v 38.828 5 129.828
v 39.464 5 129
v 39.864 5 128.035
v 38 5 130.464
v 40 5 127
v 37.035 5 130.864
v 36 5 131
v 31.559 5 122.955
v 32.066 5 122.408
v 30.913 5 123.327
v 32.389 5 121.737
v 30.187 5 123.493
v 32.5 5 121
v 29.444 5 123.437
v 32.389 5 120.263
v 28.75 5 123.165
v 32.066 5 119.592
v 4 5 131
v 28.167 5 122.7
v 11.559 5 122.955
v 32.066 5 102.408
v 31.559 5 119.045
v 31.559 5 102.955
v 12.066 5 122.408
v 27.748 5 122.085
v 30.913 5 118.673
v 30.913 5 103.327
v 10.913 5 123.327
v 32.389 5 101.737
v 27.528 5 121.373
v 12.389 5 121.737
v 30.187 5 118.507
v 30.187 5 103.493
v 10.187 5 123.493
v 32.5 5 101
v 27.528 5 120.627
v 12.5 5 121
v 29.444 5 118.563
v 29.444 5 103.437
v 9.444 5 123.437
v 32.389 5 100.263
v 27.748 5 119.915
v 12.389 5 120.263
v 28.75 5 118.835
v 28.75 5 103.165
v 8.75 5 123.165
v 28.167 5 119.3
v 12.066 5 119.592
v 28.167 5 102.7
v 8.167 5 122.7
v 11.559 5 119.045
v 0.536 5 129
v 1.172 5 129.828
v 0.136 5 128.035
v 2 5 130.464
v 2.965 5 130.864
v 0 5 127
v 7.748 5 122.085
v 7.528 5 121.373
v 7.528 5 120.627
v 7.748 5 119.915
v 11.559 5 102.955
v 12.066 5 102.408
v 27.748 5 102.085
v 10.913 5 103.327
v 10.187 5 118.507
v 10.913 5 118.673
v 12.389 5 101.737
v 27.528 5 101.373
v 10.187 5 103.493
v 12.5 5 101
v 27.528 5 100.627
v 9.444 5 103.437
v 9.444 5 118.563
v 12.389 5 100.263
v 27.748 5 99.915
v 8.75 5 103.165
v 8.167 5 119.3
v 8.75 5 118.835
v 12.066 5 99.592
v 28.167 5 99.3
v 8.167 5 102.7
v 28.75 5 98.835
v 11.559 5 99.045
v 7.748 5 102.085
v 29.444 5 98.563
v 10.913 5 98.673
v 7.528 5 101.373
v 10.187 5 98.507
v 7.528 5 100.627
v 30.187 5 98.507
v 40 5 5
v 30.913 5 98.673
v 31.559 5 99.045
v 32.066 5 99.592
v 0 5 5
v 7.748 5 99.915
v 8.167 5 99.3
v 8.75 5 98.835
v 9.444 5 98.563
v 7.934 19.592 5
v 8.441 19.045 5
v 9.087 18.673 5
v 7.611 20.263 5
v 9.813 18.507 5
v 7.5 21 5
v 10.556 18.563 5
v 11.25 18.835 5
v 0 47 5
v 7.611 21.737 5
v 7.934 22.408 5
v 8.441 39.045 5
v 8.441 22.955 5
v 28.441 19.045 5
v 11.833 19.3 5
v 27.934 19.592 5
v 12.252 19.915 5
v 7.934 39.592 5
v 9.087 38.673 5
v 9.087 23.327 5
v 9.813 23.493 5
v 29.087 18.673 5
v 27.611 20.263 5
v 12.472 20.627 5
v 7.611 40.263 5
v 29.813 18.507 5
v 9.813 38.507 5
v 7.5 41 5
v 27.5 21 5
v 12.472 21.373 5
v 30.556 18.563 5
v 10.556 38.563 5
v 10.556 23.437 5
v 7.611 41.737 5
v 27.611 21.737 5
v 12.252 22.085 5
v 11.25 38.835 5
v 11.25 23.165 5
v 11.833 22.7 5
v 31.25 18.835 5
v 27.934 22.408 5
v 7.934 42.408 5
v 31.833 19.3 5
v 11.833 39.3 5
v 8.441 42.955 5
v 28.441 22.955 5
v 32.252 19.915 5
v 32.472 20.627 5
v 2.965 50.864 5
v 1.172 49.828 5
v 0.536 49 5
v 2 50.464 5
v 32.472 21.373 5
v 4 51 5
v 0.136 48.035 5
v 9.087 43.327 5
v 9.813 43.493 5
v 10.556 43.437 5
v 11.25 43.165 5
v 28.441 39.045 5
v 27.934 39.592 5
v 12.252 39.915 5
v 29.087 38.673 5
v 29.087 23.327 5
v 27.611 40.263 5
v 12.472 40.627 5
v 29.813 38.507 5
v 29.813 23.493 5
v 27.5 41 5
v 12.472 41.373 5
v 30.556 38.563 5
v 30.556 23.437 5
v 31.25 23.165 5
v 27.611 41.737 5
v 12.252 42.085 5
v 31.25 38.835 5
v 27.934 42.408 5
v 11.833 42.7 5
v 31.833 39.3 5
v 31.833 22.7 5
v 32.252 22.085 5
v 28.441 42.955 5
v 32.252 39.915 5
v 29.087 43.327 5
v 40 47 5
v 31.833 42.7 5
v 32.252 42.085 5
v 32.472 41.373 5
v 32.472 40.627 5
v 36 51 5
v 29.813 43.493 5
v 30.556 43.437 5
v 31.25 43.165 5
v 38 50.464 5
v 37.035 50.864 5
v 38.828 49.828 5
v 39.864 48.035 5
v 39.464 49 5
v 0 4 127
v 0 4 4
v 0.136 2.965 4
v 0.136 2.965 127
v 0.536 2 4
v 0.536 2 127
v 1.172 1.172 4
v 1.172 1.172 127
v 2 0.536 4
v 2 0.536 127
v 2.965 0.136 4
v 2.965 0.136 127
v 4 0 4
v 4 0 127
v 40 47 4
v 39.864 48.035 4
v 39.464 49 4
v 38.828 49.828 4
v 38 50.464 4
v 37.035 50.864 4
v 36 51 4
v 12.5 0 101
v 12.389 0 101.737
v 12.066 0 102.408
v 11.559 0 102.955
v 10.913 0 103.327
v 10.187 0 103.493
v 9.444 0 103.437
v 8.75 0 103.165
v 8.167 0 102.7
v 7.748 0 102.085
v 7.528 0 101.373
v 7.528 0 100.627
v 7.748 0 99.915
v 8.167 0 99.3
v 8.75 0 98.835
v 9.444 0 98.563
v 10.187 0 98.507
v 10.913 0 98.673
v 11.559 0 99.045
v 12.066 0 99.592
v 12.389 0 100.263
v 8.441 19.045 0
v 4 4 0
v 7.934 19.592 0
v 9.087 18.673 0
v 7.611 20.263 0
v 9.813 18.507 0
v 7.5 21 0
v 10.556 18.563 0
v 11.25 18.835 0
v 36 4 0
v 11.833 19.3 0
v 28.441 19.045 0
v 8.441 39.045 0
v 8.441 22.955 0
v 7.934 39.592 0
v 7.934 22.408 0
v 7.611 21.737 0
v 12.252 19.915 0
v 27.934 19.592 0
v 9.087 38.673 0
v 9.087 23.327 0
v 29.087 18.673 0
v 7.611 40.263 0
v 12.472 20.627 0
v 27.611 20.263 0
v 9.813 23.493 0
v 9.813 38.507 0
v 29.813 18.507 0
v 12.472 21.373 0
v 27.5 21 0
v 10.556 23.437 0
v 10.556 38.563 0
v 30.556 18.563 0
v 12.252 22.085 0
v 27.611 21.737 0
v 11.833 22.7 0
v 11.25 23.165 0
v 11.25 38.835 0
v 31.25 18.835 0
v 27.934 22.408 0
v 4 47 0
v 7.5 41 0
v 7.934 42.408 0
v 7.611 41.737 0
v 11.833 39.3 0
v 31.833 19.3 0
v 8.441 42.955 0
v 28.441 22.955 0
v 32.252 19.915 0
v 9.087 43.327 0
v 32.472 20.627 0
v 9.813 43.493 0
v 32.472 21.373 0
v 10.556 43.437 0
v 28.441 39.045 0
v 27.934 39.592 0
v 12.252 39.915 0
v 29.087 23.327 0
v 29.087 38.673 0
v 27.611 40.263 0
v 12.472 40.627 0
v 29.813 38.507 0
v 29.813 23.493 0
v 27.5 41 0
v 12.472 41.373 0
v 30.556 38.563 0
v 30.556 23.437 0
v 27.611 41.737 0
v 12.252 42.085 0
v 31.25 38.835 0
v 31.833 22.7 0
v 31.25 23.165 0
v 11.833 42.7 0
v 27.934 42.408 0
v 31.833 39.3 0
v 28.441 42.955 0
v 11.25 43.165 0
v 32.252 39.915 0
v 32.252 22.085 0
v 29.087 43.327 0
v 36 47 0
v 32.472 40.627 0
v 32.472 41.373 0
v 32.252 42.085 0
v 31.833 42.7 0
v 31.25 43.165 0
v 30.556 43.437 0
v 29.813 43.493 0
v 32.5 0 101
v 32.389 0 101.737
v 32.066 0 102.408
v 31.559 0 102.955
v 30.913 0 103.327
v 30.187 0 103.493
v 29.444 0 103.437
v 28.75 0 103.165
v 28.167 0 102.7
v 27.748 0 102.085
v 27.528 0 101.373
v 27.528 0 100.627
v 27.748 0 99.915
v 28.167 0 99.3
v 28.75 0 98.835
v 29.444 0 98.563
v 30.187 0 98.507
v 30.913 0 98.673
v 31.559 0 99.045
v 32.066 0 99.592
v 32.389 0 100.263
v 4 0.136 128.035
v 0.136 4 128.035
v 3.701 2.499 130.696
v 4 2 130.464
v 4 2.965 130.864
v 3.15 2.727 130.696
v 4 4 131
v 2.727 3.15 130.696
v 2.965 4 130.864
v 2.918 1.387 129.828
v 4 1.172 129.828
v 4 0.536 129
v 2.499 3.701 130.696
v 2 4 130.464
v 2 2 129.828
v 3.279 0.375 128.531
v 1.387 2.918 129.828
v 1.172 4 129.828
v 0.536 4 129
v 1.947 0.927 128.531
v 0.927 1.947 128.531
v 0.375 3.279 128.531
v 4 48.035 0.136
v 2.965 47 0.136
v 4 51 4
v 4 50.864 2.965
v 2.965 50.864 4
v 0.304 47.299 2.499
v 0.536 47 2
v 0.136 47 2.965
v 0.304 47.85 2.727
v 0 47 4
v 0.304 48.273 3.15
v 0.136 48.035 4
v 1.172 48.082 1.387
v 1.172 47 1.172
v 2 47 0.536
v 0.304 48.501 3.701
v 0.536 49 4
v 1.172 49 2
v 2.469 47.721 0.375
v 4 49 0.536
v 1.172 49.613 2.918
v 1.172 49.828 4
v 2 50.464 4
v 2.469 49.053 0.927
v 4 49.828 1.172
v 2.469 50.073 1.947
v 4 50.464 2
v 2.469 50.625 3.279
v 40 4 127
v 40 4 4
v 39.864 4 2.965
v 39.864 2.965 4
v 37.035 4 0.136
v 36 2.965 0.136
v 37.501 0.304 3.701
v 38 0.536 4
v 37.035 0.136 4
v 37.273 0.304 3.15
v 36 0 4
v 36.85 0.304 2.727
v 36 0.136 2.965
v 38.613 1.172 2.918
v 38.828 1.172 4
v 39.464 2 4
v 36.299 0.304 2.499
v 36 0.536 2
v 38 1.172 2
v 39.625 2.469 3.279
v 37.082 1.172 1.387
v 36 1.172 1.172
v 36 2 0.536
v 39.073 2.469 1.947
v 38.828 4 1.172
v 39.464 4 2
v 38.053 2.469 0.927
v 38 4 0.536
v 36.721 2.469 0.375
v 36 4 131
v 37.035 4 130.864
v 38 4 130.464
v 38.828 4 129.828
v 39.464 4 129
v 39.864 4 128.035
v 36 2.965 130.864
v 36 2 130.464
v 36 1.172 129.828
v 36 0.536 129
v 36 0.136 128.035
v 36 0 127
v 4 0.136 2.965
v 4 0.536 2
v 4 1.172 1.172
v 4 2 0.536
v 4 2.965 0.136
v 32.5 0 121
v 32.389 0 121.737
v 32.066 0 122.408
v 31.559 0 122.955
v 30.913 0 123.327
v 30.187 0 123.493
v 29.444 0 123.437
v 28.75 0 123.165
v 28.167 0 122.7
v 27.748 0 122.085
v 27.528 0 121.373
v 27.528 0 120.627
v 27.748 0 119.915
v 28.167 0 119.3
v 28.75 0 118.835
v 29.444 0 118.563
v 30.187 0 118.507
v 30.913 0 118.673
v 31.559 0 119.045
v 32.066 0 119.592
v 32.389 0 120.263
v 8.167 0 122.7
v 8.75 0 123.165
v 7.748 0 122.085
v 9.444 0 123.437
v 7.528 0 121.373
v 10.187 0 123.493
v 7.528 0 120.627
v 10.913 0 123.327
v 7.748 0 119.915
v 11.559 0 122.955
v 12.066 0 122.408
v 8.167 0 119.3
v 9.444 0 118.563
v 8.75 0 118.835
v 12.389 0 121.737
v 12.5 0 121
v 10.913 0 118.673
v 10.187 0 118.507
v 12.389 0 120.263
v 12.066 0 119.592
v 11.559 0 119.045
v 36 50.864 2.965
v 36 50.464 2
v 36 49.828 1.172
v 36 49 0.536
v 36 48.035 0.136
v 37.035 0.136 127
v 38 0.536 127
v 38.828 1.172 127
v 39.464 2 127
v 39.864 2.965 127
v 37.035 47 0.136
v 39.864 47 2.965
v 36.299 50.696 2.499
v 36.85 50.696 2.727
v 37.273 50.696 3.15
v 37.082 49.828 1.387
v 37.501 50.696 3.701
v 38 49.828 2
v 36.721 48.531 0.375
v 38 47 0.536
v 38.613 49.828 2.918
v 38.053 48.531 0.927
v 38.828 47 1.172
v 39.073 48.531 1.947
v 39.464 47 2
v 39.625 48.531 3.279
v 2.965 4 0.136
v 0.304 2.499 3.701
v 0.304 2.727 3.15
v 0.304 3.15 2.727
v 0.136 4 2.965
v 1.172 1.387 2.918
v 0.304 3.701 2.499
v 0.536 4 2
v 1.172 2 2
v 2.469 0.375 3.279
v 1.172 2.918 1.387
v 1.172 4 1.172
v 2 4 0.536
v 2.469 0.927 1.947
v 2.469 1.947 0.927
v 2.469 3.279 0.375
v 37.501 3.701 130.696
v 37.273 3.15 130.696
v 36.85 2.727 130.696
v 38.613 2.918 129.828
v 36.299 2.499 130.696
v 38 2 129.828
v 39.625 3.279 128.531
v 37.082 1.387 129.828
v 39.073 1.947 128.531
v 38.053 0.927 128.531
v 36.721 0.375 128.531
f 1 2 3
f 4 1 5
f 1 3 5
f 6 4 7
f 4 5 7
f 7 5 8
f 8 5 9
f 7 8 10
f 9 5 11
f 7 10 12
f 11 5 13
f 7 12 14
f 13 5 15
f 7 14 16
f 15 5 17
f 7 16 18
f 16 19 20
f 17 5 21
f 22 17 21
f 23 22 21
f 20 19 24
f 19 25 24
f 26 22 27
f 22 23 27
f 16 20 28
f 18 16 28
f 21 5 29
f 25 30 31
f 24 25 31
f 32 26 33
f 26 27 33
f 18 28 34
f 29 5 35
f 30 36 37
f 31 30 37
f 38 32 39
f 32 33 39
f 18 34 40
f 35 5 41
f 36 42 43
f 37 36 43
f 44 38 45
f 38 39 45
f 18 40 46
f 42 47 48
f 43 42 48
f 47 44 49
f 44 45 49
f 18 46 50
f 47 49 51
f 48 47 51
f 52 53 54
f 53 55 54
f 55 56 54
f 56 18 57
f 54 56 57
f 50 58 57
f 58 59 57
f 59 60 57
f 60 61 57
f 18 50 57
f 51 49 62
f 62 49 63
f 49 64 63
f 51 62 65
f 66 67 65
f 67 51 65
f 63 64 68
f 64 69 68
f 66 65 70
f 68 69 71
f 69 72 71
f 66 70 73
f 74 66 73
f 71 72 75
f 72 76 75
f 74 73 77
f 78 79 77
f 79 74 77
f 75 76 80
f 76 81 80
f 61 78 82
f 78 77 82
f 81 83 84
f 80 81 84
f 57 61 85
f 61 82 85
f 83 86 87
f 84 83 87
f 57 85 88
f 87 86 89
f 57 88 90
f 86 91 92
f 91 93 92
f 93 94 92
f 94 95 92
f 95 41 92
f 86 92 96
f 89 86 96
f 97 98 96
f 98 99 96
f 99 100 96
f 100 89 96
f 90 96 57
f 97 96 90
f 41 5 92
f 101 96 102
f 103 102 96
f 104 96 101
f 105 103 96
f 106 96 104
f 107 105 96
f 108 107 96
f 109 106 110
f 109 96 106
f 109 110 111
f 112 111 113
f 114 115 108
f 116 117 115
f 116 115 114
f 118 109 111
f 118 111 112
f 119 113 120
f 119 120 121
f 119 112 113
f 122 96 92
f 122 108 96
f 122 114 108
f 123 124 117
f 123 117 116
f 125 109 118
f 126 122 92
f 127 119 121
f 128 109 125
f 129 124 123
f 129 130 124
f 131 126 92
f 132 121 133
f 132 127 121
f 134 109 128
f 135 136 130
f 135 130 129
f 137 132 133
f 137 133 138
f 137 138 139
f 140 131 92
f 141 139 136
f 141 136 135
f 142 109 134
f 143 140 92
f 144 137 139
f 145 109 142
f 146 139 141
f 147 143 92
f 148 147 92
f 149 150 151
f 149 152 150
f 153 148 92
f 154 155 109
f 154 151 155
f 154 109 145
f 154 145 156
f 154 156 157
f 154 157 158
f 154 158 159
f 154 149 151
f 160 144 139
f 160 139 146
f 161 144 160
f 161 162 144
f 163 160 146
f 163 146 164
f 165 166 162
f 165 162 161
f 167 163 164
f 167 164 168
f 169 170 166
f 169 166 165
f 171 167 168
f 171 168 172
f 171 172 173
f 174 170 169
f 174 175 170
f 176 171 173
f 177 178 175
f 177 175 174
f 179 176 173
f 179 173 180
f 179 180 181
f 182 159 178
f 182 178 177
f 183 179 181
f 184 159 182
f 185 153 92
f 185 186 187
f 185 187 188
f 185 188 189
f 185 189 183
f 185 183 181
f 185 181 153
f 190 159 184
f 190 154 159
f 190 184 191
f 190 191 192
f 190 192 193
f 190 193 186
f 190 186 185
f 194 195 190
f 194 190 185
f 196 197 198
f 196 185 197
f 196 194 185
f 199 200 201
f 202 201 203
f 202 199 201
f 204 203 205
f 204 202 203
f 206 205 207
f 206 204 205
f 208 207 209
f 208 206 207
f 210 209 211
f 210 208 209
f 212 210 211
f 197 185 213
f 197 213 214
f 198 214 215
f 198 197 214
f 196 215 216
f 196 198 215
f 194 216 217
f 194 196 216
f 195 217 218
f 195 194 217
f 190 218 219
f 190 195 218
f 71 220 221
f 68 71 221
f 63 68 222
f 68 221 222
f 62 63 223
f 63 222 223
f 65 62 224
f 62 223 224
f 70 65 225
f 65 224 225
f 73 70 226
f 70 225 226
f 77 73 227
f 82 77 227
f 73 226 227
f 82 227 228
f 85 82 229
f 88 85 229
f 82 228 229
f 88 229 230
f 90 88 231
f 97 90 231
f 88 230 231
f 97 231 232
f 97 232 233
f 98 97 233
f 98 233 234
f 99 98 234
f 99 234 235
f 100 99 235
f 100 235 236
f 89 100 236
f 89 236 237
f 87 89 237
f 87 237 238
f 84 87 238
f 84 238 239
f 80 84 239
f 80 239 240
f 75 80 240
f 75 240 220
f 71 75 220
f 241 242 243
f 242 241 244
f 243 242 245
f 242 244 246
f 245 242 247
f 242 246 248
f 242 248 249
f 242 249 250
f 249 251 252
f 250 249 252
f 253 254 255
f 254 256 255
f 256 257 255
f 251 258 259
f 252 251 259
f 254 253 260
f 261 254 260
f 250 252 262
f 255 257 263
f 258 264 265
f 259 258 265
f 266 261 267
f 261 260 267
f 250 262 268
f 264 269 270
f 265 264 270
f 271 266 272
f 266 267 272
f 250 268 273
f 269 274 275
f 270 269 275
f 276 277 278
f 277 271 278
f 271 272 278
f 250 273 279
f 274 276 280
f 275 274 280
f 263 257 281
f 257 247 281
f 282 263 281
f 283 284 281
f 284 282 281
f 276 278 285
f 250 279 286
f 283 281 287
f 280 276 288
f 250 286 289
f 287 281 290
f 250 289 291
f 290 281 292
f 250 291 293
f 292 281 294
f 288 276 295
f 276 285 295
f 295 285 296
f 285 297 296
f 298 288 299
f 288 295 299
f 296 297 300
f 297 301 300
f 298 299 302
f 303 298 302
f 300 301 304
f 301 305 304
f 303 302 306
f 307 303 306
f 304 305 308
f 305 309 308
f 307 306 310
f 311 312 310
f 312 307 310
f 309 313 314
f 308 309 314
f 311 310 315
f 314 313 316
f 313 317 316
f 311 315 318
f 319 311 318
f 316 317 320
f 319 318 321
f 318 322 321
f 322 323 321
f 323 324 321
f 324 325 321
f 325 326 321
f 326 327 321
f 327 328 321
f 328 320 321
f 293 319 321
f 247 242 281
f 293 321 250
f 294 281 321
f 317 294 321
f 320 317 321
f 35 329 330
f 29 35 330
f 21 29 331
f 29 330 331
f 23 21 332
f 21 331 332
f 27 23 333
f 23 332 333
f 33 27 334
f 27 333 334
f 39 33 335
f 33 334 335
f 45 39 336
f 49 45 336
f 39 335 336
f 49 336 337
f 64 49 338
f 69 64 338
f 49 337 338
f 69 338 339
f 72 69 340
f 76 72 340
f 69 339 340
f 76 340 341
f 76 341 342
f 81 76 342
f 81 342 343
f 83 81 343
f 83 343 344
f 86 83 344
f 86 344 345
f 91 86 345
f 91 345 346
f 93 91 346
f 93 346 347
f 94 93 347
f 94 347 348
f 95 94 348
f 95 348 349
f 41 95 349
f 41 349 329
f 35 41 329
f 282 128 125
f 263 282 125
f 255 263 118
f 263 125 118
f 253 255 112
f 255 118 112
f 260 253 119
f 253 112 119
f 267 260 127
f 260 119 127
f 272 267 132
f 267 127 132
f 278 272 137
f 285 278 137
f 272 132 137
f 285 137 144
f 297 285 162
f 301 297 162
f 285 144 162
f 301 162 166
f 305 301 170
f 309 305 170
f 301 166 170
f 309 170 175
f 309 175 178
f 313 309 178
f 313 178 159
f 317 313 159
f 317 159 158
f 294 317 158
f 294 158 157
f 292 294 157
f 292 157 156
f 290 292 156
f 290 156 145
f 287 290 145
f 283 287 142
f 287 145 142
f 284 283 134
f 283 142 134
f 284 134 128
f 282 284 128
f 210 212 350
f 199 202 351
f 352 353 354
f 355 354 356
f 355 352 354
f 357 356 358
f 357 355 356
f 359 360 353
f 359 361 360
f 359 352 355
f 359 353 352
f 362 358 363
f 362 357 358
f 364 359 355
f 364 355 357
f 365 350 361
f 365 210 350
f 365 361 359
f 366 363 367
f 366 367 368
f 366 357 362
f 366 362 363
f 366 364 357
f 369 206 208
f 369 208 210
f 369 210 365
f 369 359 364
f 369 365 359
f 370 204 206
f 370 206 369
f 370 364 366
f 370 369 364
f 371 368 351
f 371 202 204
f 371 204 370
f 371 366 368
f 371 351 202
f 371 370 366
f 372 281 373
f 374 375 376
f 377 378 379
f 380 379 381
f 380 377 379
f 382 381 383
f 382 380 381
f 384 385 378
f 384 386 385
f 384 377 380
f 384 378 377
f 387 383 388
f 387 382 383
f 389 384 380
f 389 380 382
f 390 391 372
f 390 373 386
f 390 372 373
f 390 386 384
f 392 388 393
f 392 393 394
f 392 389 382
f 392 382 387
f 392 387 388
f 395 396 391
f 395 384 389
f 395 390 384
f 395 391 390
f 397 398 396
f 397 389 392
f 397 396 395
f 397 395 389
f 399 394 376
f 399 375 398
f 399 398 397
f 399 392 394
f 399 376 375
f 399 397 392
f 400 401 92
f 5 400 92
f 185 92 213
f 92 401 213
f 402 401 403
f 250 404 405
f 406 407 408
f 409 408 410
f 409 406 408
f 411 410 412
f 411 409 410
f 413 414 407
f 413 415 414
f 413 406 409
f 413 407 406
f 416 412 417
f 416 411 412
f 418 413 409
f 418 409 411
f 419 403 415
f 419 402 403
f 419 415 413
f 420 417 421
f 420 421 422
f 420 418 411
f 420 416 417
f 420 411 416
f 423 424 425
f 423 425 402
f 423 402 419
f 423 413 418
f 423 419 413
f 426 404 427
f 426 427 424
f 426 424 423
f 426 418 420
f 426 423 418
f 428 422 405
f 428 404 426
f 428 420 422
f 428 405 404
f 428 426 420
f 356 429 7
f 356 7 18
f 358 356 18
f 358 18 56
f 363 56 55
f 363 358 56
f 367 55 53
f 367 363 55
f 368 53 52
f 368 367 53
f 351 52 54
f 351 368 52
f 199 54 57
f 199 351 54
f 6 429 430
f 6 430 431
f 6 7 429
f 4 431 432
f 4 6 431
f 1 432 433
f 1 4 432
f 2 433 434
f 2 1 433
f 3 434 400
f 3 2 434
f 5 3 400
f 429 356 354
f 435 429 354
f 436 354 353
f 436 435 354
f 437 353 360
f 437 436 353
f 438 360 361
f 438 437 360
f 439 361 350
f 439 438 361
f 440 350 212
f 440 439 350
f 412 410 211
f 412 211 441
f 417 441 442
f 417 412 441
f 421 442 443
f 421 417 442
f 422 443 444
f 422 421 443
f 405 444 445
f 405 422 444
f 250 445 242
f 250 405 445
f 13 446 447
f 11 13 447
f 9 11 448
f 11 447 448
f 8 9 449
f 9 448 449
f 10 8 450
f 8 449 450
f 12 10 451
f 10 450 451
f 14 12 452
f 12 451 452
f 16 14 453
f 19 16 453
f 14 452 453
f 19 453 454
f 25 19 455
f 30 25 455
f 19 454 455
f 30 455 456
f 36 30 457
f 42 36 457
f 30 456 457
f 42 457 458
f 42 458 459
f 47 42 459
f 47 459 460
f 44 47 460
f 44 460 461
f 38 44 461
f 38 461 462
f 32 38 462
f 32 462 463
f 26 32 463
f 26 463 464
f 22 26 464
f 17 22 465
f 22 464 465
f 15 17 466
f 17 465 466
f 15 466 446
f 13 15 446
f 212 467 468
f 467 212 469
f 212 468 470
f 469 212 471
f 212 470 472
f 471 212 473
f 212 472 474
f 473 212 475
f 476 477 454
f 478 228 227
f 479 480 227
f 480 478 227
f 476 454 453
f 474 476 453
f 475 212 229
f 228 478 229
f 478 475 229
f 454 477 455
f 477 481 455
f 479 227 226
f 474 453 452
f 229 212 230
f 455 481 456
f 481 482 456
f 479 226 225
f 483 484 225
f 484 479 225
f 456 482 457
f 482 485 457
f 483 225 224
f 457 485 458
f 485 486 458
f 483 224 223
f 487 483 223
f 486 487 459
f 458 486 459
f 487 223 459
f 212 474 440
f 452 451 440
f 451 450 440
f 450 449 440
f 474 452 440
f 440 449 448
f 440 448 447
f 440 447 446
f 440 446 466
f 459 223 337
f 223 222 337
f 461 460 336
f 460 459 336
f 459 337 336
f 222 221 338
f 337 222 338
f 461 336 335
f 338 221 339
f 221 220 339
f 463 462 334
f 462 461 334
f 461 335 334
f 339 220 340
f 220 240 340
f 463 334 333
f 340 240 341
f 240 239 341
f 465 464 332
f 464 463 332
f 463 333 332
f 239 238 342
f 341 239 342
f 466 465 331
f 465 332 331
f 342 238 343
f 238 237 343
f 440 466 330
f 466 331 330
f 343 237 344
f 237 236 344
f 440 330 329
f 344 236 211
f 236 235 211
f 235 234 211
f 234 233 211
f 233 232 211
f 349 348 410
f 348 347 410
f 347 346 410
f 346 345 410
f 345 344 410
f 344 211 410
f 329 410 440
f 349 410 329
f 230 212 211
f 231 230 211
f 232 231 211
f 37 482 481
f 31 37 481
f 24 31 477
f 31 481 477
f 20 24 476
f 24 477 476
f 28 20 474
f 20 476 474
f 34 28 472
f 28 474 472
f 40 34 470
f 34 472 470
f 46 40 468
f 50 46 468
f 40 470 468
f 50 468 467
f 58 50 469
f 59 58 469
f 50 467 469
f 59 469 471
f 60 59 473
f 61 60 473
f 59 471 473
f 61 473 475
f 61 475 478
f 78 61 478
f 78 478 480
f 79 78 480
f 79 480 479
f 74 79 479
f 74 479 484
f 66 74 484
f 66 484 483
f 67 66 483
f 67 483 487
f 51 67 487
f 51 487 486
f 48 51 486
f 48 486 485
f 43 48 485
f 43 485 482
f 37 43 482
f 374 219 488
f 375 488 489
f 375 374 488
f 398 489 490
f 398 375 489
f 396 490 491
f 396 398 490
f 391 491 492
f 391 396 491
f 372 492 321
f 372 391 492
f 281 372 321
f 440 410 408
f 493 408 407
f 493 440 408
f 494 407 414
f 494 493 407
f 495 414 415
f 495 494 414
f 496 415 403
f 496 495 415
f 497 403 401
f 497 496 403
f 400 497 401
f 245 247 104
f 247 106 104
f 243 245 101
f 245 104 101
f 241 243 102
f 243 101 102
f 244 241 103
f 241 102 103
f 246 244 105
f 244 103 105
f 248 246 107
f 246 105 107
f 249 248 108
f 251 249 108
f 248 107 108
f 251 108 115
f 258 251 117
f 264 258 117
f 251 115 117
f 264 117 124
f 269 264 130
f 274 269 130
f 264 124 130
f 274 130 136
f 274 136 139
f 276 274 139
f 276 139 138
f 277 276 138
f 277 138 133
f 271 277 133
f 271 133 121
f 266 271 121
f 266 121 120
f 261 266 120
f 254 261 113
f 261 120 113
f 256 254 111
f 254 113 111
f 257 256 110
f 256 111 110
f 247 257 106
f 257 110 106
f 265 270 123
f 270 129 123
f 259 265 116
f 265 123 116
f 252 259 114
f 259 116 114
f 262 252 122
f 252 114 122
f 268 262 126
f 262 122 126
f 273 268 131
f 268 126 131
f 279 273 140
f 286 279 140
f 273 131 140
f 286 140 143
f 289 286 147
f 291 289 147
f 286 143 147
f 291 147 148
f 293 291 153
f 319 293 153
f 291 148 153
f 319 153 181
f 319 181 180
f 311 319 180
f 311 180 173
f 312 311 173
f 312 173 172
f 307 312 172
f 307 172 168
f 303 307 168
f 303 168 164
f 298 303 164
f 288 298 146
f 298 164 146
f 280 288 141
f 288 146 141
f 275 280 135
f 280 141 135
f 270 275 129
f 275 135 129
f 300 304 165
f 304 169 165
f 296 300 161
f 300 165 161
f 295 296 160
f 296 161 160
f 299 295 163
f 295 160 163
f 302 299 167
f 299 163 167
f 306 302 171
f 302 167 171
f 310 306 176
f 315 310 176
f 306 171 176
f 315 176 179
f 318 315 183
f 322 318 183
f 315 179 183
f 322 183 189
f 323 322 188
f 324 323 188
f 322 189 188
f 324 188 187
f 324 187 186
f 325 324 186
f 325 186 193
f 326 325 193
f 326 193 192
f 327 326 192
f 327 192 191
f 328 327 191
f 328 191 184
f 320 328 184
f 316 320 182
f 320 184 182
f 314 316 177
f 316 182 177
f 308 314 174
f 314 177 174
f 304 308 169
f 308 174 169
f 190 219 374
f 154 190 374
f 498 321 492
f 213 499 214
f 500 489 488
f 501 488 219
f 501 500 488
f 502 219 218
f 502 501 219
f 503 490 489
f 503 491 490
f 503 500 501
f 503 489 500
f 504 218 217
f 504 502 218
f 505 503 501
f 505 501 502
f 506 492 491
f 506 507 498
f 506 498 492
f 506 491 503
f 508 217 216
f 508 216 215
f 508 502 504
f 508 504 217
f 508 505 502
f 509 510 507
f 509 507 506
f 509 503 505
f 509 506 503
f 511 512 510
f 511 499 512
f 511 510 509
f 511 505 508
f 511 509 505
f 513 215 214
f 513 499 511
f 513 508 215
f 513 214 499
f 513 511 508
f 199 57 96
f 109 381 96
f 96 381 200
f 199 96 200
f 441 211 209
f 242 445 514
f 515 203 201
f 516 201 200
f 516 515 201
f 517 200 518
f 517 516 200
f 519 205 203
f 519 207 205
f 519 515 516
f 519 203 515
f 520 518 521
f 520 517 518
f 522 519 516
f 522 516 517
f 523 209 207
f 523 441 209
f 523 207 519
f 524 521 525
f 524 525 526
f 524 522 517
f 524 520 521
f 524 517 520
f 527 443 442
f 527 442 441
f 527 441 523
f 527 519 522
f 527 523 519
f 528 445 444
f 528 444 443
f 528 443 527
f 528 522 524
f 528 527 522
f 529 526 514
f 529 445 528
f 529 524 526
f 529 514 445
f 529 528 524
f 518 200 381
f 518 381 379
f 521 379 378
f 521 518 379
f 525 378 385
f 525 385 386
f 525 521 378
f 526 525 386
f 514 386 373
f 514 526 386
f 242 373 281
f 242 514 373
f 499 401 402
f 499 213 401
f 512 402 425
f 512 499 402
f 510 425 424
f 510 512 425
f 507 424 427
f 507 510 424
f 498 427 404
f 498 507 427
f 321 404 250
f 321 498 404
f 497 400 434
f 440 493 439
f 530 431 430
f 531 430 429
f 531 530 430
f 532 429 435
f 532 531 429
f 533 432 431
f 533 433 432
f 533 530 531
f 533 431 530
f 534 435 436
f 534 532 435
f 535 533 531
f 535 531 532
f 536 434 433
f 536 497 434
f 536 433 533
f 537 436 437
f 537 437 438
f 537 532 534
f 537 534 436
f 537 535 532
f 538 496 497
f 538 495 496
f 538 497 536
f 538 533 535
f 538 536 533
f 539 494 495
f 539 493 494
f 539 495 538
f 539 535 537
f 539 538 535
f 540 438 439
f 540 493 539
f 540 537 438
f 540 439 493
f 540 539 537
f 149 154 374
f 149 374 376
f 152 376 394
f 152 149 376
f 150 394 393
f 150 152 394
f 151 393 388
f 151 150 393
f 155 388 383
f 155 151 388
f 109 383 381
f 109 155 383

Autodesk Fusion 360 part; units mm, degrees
sketch "Sketch1" plane through (0, 0, 0) normal (0, 0, 1) x (1, 0, 0)
  line L0 (0, 0) -> (40, 0)
  line L1 (40, 0) -> (40, 51)
  line L2 (40, 51) -> (0, 51)
  line L3 (0, 51) -> (0, 0)
  dimension "d1" = 40
  dimension "d2" = 51
extrude "Extrude1" add sketch "Sketch1" along normal blind 5
sketch "Sketch2" plane through (0, 0, 5) normal (0, 0, 1) x (-1, 0, 0)
  line L0 (0, -51) -> (0, 0)
  line L1 (0, 0) -> (-40, 0)
  line L2 (-40, 0) -> (-40, -51)
  line L3 (-40, -51) -> (0, -51)
  line L4 (0, 0) -> (-40, 0)
  line L5 (-40, 0) -> (-40, -5)
  line L6 (-40, -5) -> (0, -5)
  line L7 (0, -5) -> (0, 0)
  dimension "d5" = 40
  dimension "d6" = 5
extrude "Extrude2" add sketch "Sketch2" along normal blind 126 contours L0 L1 L2 L4 L5 L6 L7
sketch "Sketch3" plane through (0, 0, 0) normal (0, -1, 0) x (1, 0, 0)
  line L0 (0, 0) -> (40, 0)
  line L1 (40, 0) -> (40, 131)
  line L2 (40, 131) -> (0, 131)
  line L3 (0, 131) -> (0, 0)
  line L4 (0, 131) -> (10, 131)
  line L5 (10, 131) -> (10, 121)
  line L6 (10, 121) -> (0, 121)
  line L7 (0, 121) -> (0, 131)
  circle A0 centre (10, 121) radius 2.5
  line L8 (10, 121) -> (30, 121)
  line L9 (30, 121) -> (30, 101)
  line L10 (30, 101) -> (10, 101)
  line L11 (10, 101) -> (10, 121)
  circle A1 centre (30, 121) radius 2.5
  circle A2 centre (10, 101) radius 2.5
  circle A3 centre (30, 101) radius 2.5
  dimension "d9" = 10
  dimension "d10" = 10
  dimension "d11" = 5
  dimension "d12" = 20
  dimension "d13" = 20
  dimension "d14" = 5
  dimension "d15" = 5
  dimension "d16" = 5
extrude "Extrude3" cut sketch "Sketch3" against normal blind 5 contours L5 L6 A0 | L6 A0 L11 | L5 A0 L8 | A0 L8 L11 | L10 L11 A2 | L10 L11 A2 | L8 L9 A1 | L8 L9 A1 | L9 L10 A3 | L9 L10 A3
sketch "Sketch4" plane through (0, 0, 5) normal (0, 0, 1) x (-1, 0, 0)
  line L0 (0, -5) -> (-40, -5)
  line L1 (-40, -5) -> (-40, -51)
  line L2 (-40, -51) -> (0, -51)
  line L3 (0, -51) -> (0, -5)
  line L4 (0, -51) -> (-10, -51)
  line L5 (-10, -51) -> (-10, -41)
  line L6 (-10, -41) -> (0, -41)
  line L7 (0, -41) -> (0, -51)
  line L8 (-10, -41) -> (-30, -41)
  line L9 (-30, -41) -> (-30, -21)
  line L10 (-30, -21) -> (-10, -21)
  line L11 (-10, -21) -> (-10, -41)
  circle A0 centre (-10, -41) radius 2.5
  circle A1 centre (-30, -41) radius 2.5
  circle A2 centre (-10, -21) radius 2.5
  circle A3 centre (-30, -21) radius 2.5
  dimension "d19" = 10
  dimension "d20" = 10
  dimension "d21" = 20
  dimension "d22" = 20
  dimension "d23" = 5
  dimension "d24" = 5
  dimension "d25" = 5
  dimension "d26" = 5
extrude "Extrude4" cut sketch "Sketch4" against normal blind 5 contours L5 L6 A0 | L6 L11 A0 | L5 L8 A0 | L8 L11 A0 | L10 L11 A2 | L10 L11 A2 | L8 L9 A1 | L8 L9 A1 | L9 L10 A3 | L9 L10 A3
fillet "Fillet1" radius 4 11 edges at (40, 25.5, 0) (20, 0, 0) (20, 51, 0) (40, 51, 2.5) (0, 51, 2.5) (0, 25.5, 0) (40, 0, 65.5) (40, 2.5, 131) (0, 0, 65.5) (0, 2.5, 131) (20, 0, 131)
